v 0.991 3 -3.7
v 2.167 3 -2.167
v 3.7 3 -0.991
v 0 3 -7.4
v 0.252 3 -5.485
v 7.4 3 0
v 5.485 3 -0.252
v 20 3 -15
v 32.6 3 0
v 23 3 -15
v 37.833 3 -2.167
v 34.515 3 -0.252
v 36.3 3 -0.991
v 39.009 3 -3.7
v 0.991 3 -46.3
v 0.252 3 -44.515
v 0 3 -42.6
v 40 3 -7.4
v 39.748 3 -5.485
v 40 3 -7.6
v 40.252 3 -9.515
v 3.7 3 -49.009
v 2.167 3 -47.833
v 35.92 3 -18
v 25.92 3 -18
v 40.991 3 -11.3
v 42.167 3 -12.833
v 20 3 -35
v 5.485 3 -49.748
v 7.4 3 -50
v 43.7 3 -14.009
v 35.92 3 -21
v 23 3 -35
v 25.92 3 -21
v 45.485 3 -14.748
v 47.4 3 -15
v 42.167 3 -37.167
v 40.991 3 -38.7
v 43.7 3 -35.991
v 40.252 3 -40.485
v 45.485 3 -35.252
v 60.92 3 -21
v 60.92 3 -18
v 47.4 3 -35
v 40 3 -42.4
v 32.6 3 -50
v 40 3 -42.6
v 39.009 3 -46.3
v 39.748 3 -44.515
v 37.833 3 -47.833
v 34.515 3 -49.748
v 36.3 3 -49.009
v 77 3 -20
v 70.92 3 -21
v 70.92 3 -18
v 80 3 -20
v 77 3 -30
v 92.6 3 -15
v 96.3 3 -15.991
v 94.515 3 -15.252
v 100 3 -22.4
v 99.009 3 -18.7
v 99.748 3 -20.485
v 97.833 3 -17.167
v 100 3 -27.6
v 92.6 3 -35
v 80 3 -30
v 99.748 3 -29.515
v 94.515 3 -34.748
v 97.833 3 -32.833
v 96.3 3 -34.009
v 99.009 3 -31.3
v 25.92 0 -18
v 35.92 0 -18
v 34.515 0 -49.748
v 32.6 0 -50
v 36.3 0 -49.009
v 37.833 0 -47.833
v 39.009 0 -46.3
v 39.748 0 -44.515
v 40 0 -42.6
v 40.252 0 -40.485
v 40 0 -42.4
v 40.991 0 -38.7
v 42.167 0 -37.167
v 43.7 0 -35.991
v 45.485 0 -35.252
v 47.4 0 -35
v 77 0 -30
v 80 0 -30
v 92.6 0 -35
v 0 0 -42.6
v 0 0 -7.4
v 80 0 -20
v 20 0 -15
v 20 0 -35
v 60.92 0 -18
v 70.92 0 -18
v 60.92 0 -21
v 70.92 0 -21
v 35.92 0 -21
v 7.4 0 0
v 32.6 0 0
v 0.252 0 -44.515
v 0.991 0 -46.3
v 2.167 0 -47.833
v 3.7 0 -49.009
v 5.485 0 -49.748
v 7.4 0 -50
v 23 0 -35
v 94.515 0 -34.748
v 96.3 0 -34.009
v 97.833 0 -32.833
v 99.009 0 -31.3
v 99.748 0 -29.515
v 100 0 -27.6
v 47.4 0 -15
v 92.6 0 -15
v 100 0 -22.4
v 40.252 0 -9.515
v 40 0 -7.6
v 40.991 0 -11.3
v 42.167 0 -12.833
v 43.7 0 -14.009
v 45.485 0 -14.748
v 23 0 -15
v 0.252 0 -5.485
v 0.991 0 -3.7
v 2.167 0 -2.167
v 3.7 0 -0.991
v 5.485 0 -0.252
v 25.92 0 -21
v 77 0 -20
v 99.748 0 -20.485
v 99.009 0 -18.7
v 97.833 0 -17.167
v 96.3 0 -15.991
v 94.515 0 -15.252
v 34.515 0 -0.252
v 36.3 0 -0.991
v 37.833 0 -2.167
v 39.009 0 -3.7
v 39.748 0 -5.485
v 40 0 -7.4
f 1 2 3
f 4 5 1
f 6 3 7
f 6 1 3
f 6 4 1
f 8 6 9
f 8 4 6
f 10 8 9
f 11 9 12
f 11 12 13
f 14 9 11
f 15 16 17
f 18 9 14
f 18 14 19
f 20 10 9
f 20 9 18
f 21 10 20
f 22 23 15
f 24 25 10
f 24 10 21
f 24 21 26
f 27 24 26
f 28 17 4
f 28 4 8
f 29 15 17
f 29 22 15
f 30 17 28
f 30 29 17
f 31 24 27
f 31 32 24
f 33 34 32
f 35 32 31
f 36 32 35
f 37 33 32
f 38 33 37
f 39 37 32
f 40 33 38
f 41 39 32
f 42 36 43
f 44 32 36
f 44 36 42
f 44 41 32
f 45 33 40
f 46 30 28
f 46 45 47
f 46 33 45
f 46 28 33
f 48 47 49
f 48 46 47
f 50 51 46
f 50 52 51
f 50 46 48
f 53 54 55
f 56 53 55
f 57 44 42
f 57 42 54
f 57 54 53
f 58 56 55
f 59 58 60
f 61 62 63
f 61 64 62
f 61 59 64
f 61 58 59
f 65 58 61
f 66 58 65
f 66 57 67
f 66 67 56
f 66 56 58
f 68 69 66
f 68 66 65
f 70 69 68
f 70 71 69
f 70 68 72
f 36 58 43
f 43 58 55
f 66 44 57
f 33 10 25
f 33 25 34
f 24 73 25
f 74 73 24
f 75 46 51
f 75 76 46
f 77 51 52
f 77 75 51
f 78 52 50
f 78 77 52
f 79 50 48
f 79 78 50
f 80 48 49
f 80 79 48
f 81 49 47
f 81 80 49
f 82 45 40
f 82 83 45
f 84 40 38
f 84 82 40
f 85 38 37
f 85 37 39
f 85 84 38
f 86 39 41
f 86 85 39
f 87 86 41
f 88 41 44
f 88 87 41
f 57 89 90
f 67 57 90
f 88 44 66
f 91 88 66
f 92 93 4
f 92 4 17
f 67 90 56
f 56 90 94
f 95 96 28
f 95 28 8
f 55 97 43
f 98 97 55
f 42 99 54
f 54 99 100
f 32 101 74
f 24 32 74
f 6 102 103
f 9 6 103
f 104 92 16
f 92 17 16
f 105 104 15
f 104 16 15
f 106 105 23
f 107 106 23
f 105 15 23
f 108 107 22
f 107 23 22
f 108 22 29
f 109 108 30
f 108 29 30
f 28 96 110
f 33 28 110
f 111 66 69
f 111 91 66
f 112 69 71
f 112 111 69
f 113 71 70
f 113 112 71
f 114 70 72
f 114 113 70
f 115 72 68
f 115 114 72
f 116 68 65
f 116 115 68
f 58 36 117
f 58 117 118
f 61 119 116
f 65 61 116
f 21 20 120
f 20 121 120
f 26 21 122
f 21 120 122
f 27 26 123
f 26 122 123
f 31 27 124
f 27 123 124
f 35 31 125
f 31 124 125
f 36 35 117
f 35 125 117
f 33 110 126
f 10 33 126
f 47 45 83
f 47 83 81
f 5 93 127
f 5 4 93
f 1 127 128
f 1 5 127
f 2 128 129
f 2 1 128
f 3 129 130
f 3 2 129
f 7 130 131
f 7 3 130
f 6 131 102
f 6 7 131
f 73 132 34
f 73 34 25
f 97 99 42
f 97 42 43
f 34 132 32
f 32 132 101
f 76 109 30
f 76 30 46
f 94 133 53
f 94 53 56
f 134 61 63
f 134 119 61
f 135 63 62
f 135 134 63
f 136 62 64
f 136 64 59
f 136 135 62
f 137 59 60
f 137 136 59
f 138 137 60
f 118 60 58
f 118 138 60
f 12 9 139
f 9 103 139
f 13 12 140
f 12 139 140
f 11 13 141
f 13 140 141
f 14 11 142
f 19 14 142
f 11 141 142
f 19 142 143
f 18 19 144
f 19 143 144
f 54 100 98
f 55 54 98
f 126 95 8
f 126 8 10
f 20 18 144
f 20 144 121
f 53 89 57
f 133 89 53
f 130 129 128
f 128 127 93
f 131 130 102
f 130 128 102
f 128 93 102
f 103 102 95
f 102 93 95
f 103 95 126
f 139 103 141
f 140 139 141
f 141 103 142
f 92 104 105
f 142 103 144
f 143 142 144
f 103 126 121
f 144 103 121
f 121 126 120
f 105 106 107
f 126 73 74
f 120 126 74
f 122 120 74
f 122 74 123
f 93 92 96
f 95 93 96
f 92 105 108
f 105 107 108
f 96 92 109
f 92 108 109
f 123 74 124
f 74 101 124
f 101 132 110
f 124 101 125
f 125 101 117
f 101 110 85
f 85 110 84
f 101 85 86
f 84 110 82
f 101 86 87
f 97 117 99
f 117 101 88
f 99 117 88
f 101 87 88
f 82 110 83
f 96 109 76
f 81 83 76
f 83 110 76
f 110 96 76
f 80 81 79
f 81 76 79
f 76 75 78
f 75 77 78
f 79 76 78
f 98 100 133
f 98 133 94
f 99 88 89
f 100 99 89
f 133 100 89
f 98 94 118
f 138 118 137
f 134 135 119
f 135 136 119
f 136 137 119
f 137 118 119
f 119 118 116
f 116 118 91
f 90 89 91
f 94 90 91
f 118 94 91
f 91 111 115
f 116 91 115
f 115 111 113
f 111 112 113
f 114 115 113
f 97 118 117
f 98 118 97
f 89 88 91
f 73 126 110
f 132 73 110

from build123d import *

# Parameters (mm, degrees)
SKETCH1_W           = 100
SKETCH1_H           = 50
BOSS_EXTRUDE1_DEPTH = 3
SKETCH2_W           = 60
SKETCH2_H           = 15
CUT_EXTRUDE1_DEPTH  = 3
FILLET1_R           = 7.4
SKETCH3_W           = 3
SKETCH3_H           = 20
SKETCH3_H_2         = 10
CUT_EXTRUDE2_DEPTH  = 10
SKETCH4_W           = 10
SKETCH4_H           = 3
CUT_EXTRUDE3_DEPTH  = 3


with BuildPart() as part:
    # Sketch1 → Boss-Extrude1 (new body)
    with BuildSketch(Plane(origin=(0, 0, 0), x_dir=(1, 0, 0), z_dir=(0, 1, 0))):
        with Locations((50, 25)):
            Rectangle(SKETCH1_W, SKETCH1_H)
    extrude(amount=BOSS_EXTRUDE1_DEPTH)

    # Sketch2 → Cut-Extrude1 (cut)
    with BuildSketch(Plane(origin=(0, 3, 0), x_dir=(1, 0, 0), z_dir=(0, 1, 0))):
        with Locations((70, 7.5)):
            Rectangle(SKETCH2_W, SKETCH2_H)
        with Locations((70, 42.5)):
            Rectangle(SKETCH2_W, SKETCH2_H)
    extrude(amount=-CUT_EXTRUDE1_DEPTH, mode=Mode.SUBTRACT)

    # Fillet1
    fillet1_edges = [part.edges().sort_by_distance(p)[0] for p in [
        (100, 1.5, -15),
        (40, 1.5, 0),
        (40, 1.5, -15),
        (100, 1.5, -35),
        (40, 1.5, -35),
        (40, 1.5, -50),
        (0, 1.5, -50),
        (0, 1.5, 0),
    ]]
    fillet(fillet1_edges, radius=FILLET1_R)

    # Sketch3 → Cut-Extrude2 (cut)
    with BuildSketch(Plane.XZ):
        with Locations((21.5, -25)):
            Rectangle(SKETCH3_W, SKETCH3_H)
        with Locations((78.5, -25)):
            Rectangle(SKETCH3_W, SKETCH3_H_2)
    extrude(amount=-CUT_EXTRUDE2_DEPTH, mode=Mode.SUBTRACT)

    # Sketch4 → Cut-Extrude3 (cut)
    with BuildSketch(Plane.XZ):
        with Locations((30.91970706, -19.5)):
            Rectangle(SKETCH4_W, SKETCH4_H)
        with Locations((65.91970706, -19.5)):
            Rectangle(SKETCH4_W, SKETCH4_H)
    extrude(amount=-CUT_EXTRUDE3_DEPTH, mode=Mode.SUBTRACT)


solid = part.part
